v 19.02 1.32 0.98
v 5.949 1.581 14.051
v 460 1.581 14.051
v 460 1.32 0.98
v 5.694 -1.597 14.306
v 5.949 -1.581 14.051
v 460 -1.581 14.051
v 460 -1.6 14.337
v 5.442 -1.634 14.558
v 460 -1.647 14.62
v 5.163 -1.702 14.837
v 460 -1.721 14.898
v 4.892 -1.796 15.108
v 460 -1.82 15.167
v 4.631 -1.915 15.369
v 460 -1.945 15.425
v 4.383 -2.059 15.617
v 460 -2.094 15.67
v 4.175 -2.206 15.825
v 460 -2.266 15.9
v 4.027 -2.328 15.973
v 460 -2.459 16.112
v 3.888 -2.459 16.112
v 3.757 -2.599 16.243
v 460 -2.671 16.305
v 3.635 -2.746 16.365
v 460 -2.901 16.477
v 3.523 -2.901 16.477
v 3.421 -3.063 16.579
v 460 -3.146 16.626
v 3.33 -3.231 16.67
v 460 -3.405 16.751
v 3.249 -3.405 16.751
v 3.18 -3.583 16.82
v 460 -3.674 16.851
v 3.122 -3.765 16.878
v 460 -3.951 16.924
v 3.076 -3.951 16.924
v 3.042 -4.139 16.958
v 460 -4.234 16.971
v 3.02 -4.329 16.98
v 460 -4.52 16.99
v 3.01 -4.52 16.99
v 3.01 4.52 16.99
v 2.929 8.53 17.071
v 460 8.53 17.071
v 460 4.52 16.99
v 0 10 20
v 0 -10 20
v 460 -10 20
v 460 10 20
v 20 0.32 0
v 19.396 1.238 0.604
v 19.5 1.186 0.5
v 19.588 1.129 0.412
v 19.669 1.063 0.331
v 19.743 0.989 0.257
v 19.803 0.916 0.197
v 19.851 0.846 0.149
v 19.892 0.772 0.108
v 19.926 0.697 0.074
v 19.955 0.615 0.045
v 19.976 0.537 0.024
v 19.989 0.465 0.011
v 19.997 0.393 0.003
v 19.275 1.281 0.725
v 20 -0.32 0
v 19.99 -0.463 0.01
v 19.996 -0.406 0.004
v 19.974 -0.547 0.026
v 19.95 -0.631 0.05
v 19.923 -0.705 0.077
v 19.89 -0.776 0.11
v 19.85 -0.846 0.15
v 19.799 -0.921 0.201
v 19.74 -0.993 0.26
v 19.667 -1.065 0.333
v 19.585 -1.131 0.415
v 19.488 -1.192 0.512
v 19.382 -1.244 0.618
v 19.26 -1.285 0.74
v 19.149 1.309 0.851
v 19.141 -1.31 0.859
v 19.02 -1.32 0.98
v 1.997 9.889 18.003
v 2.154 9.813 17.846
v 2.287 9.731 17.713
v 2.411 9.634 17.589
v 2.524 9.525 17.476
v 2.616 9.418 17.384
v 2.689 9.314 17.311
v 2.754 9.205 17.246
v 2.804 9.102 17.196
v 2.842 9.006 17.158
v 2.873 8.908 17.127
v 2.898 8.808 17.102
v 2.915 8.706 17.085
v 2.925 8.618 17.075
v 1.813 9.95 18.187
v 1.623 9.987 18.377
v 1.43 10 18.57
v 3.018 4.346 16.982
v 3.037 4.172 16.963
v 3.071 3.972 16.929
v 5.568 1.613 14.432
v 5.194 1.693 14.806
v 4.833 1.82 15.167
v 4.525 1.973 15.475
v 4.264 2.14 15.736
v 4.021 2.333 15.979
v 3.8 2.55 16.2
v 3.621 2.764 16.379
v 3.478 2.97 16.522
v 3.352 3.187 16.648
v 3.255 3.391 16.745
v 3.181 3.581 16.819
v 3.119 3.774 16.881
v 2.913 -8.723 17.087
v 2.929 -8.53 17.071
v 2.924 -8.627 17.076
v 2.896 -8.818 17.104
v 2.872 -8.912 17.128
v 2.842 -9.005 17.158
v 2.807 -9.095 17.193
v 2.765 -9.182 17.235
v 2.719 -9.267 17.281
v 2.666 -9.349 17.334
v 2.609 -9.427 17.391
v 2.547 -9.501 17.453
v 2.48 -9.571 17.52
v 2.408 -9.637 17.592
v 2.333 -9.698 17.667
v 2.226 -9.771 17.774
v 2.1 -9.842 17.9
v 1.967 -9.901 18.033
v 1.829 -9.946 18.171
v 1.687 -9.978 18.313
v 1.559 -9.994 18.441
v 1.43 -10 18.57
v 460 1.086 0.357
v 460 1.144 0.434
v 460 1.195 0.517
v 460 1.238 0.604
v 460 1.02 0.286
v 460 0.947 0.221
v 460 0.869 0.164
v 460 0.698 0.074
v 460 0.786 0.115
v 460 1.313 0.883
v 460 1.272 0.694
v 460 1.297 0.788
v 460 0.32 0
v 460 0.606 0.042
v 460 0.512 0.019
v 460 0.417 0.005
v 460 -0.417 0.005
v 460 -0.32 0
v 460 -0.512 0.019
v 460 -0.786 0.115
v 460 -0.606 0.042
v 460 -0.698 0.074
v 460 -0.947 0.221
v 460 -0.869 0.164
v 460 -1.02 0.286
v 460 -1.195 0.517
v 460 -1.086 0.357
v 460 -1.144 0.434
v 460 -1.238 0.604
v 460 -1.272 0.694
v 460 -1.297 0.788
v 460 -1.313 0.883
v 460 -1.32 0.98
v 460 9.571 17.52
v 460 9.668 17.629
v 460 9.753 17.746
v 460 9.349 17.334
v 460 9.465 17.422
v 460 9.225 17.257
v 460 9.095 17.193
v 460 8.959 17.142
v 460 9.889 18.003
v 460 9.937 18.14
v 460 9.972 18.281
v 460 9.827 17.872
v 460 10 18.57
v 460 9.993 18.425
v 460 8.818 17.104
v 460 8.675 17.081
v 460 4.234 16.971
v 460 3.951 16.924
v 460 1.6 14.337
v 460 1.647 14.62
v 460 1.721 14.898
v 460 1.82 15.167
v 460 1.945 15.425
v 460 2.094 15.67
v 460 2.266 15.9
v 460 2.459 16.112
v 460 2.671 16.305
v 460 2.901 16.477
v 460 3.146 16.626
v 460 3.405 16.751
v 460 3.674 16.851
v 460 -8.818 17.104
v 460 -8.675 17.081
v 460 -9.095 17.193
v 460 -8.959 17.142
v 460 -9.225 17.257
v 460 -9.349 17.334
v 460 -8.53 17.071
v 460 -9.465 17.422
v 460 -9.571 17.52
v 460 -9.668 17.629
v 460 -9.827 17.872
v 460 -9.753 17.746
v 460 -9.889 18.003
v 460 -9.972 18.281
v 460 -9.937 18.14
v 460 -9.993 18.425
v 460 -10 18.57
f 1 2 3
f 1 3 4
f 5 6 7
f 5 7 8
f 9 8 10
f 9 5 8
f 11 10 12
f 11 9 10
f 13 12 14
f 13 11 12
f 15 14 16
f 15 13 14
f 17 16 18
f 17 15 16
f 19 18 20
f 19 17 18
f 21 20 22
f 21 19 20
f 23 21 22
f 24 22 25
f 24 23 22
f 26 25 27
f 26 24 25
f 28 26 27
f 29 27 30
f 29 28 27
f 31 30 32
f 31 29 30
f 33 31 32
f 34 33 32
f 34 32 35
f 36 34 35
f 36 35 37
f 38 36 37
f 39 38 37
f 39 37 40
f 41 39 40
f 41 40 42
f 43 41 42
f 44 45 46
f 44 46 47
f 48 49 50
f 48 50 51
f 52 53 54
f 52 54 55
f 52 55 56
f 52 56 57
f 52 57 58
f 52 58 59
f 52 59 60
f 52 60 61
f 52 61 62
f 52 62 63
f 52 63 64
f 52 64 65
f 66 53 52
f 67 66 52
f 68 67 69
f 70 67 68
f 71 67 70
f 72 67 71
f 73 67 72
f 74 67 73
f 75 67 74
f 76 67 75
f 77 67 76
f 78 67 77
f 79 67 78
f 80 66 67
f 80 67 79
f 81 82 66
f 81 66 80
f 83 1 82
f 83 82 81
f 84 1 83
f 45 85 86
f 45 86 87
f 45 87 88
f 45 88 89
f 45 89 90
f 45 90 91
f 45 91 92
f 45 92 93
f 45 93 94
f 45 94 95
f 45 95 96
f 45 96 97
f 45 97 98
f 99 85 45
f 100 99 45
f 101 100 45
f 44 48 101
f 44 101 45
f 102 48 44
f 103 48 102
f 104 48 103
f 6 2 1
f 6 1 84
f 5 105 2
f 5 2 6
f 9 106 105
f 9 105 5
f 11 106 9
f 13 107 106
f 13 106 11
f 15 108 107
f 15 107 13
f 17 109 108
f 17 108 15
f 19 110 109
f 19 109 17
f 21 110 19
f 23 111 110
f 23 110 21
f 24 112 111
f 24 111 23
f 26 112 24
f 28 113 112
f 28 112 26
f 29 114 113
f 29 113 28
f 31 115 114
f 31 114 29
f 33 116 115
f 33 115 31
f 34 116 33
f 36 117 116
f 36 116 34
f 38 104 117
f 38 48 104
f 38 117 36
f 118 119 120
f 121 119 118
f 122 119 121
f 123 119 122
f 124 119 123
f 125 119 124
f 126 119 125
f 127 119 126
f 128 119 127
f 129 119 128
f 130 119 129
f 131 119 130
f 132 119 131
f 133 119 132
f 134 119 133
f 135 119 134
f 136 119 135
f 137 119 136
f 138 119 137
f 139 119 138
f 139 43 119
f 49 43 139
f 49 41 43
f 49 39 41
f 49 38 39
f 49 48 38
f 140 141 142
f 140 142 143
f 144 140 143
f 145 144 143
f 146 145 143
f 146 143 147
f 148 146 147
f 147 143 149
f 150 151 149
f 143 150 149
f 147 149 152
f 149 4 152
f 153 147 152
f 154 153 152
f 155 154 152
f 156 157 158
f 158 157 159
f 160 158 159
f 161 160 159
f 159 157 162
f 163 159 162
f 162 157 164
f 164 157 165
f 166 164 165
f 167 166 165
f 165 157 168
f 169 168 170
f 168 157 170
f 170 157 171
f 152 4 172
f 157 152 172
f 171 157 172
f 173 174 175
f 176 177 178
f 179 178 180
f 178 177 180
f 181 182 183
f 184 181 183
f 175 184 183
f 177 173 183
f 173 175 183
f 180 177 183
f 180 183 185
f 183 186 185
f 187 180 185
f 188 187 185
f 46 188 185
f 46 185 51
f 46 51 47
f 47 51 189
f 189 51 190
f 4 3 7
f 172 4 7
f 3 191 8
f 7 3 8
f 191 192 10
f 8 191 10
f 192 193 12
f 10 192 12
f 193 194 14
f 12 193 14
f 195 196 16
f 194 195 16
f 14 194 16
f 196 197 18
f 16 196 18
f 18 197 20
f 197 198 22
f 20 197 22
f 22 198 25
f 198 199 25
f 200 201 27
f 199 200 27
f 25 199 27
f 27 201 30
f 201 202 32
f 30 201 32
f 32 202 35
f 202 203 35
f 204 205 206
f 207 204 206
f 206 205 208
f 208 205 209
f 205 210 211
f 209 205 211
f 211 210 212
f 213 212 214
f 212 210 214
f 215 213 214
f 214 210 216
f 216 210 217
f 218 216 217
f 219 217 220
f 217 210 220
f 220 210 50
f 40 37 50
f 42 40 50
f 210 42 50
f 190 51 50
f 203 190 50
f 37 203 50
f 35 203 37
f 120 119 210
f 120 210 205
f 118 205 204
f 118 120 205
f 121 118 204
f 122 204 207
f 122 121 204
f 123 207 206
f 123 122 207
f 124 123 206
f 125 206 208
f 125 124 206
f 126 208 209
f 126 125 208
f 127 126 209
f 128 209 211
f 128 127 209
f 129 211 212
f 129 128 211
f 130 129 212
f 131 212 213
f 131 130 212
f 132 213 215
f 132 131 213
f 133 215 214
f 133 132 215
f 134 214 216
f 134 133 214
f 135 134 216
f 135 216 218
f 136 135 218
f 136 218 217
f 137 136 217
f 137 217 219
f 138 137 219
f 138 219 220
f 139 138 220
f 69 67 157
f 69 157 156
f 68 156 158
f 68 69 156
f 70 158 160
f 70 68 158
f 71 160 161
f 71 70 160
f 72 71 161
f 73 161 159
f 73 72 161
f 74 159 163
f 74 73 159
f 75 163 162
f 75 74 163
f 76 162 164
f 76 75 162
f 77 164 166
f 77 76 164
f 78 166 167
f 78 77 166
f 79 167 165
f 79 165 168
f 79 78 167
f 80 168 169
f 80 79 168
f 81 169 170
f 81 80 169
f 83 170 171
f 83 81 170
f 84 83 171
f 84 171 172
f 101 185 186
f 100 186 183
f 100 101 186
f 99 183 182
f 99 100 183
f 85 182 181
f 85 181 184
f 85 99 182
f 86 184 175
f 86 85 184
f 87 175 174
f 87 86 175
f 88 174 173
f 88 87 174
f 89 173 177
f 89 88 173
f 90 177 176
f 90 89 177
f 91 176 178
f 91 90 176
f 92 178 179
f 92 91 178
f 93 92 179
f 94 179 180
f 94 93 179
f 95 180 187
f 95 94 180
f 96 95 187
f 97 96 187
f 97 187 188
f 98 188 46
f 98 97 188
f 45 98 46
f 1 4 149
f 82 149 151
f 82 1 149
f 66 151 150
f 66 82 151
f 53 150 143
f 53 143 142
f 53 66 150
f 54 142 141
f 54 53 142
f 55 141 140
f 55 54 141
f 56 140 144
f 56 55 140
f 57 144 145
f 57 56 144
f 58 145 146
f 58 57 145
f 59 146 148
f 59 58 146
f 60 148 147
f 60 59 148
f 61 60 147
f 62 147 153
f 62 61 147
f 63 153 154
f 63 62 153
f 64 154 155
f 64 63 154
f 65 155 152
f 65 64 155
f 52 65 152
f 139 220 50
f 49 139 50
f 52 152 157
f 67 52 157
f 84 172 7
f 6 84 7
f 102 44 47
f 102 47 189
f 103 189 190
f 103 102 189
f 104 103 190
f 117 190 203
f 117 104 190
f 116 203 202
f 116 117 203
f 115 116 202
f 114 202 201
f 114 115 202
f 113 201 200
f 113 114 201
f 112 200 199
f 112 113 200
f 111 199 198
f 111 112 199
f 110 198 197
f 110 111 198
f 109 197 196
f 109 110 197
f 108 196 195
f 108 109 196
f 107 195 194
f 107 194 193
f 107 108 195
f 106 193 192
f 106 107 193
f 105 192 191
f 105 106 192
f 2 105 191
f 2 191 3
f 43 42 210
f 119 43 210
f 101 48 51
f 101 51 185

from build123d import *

# Parameters (mm, degrees)
T_SECTION_T_20_X_20_1_DEPTH = 460
SKETCH13_W                  = 20
SKETCH13_H                  = 30
CUT_EXTRUDE1_DEPTH          = 451.22216738


with BuildPart() as part:
    # Sketch12 → T section T 20 X 20(1) (new body)
    with BuildSketch(Plane.YZ):
        with BuildLine():
            Line((-10, 20), (10, 20))
            Line((10, 20), (10, 18.570314587))
            ThreePointArc((10, 18.570314587), (9.571214338, 17.520314662), (8.530000209, 17.070614622))
            Line((8.530000209, 17.070614622), (4.520436432, 16.990406743))
            ThreePointArc((4.520436432, 16.990406743), (2.459116507, 16.112327155), (1.581036919, 14.05100723))
            Line((1.581036919, 14.05100723), (1.319562646, 0.97999986))
            ThreePointArc((1.319562646, 0.97999986), (1.019762619, 0.285857108), (0.319762669, 0))
            Line((0.319762669, 0), (-0.319762669, 0))
            ThreePointArc((-0.319762669, 0), (-1.019762619, 0.285857108), (-1.319562646, 0.97999986))
            Line((-1.319562646, 0.97999986), (-1.581036919, 14.05100723))
            ThreePointArc((-1.581036919, 14.05100723), (-2.459116507, 16.112327155), (-4.520436432, 16.990406743))
            Line((-4.520436432, 16.990406743), (-8.530000209, 17.070614622))
            ThreePointArc((-8.530000209, 17.070614622), (-9.571214338, 17.520314662), (-10, 18.570314587))
            Line((-10, 18.570314587), (-10, 20))
        make_face()
    extrude(amount=T_SECTION_T_20_X_20_1_DEPTH)

    # Sketch13 → Cut-Extrude1 (cut, through all)
    with BuildSketch(Plane(origin=(10, 0, 10), x_dir=(0, -1, 0), z_dir=(-0.7071067811865464, 0, -0.7071067811865488))):
        Rectangle(SKETCH13_W, SKETCH13_H)
    extrude(amount=CUT_EXTRUDE1_DEPTH, mode=Mode.SUBTRACT)


solid = part.part
